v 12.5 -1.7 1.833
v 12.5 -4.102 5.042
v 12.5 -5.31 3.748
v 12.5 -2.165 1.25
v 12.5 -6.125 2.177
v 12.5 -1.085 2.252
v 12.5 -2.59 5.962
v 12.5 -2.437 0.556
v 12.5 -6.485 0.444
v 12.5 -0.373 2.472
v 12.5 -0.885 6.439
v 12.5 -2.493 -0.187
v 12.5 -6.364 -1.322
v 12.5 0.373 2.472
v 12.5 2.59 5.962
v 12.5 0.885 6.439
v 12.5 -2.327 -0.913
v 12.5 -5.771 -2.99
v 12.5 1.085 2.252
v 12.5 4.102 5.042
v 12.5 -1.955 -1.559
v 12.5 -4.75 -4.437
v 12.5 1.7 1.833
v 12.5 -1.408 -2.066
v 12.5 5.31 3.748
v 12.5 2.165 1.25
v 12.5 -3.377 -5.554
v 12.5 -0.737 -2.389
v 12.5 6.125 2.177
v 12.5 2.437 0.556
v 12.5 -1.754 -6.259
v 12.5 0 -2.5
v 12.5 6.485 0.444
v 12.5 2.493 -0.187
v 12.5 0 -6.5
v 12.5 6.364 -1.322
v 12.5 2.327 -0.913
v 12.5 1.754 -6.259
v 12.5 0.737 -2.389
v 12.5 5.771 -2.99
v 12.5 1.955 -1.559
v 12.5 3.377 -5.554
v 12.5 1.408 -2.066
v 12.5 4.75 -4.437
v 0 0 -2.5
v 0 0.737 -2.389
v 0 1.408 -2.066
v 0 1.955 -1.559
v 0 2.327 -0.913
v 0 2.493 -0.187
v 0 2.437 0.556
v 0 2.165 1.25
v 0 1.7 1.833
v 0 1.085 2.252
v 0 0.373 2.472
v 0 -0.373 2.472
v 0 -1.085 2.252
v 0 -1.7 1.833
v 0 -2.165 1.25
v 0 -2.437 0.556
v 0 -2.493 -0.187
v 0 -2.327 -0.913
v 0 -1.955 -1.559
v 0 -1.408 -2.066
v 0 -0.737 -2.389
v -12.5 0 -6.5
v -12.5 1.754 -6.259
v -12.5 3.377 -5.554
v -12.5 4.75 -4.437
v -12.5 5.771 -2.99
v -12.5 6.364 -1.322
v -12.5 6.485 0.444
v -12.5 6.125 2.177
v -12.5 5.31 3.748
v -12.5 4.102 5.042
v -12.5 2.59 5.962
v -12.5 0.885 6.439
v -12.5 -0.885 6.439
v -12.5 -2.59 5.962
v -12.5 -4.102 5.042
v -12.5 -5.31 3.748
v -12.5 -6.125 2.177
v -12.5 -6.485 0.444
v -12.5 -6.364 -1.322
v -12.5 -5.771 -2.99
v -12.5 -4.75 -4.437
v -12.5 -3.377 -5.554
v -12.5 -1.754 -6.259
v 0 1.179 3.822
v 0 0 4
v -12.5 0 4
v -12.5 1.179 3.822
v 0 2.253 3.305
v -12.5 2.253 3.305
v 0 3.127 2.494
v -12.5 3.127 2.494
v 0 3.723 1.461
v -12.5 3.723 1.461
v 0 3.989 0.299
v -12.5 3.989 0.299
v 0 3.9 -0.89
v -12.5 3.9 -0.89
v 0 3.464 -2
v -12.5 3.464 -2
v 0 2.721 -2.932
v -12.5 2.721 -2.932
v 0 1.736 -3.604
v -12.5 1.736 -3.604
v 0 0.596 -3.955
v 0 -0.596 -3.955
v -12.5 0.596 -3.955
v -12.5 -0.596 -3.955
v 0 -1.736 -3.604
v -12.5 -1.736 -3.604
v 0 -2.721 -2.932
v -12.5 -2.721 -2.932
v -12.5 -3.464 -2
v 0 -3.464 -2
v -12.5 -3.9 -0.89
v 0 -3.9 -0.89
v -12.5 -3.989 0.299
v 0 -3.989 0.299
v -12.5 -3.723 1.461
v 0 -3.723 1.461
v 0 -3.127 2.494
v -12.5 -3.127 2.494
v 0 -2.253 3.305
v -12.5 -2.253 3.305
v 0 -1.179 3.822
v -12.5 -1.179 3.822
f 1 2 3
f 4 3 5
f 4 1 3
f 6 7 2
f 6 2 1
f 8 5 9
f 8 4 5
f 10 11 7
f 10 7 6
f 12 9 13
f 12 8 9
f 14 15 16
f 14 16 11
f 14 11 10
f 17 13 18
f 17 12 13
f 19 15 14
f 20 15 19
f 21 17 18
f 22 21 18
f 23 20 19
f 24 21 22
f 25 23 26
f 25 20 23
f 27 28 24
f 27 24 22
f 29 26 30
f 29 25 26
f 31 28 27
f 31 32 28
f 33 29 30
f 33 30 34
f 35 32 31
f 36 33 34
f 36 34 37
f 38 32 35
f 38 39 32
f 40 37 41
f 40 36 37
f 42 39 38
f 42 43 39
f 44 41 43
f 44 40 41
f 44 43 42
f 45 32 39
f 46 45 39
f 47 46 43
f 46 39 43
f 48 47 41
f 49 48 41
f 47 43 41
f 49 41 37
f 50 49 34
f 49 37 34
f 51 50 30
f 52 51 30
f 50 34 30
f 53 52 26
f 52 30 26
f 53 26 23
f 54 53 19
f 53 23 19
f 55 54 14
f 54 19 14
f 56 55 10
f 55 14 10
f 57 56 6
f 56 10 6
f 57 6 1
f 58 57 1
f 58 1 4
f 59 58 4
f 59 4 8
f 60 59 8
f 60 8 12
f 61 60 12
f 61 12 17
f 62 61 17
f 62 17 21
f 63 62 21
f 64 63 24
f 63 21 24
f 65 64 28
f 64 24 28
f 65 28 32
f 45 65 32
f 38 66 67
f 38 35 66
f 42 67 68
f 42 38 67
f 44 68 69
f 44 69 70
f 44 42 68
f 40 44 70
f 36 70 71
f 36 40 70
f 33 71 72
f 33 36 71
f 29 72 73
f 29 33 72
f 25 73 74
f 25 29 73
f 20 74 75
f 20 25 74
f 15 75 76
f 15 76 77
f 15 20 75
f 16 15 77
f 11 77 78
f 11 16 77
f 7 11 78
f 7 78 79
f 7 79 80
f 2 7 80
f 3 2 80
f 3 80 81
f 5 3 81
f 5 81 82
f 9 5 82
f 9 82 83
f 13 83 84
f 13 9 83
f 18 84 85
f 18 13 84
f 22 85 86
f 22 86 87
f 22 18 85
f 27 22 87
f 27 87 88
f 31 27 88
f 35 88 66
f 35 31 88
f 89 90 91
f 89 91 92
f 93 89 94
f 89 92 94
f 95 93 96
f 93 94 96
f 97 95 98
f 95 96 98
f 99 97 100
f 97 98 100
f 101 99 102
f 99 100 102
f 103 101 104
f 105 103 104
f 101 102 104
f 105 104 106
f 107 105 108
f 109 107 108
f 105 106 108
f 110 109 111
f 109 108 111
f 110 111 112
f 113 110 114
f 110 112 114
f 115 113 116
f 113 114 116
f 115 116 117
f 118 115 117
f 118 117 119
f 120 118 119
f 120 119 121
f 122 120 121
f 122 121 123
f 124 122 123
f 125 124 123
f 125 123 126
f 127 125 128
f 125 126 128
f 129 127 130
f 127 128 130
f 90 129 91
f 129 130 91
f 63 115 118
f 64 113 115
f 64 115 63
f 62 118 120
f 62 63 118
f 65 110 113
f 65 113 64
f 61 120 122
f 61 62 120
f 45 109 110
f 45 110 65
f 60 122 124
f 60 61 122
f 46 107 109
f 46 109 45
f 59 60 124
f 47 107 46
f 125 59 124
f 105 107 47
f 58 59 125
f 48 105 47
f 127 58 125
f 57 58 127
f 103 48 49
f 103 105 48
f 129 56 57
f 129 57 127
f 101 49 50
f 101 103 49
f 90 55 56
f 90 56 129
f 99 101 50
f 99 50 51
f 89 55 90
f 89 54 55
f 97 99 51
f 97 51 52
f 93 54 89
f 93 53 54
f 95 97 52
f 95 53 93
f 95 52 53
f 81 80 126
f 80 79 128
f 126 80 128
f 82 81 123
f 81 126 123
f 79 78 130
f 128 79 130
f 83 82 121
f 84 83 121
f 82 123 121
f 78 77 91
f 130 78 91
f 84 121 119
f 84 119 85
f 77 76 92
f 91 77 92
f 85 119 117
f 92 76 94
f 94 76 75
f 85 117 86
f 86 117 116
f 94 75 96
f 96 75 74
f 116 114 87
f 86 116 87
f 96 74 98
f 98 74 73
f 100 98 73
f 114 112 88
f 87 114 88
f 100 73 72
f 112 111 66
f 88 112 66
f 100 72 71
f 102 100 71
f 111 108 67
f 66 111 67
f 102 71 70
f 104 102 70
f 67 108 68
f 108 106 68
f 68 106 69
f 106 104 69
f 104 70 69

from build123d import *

# Parameters (mm, degrees)
SKETCH1_R           = 6.5
BOSS_EXTRUDE1_DEPTH = 12.5
SKETCH2_R           = 2.5
CUT_EXTRUDE1_DEPTH  = 12.5
SKETCH3_R           = 4
CUT_EXTRUDE2_DEPTH  = 12.5


with BuildPart() as part:
    # Sketch1 → Boss-Extrude1 (new, symmetric)
    with BuildSketch(Plane(origin=(0, 0, 0), x_dir=(0, 0, -1), z_dir=(1, 0, 0))):
        Circle(SKETCH1_R)
    extrude(amount=BOSS_EXTRUDE1_DEPTH, both=True)

    # Sketch2 → Cut-Extrude1 (cut)
    with BuildSketch(Plane(origin=(12.5, 0, 0), x_dir=(0, 0, -1), z_dir=(1, 0, 0))):
        Circle(SKETCH2_R)
    extrude(amount=-CUT_EXTRUDE1_DEPTH, mode=Mode.SUBTRACT)

    # Sketch3 → Cut-Extrude2 (cut)
    with BuildSketch(Plane.ZY.offset(12.5)):
        Circle(SKETCH3_R)
    extrude(amount=-CUT_EXTRUDE2_DEPTH, mode=Mode.SUBTRACT)


solid = part.part
